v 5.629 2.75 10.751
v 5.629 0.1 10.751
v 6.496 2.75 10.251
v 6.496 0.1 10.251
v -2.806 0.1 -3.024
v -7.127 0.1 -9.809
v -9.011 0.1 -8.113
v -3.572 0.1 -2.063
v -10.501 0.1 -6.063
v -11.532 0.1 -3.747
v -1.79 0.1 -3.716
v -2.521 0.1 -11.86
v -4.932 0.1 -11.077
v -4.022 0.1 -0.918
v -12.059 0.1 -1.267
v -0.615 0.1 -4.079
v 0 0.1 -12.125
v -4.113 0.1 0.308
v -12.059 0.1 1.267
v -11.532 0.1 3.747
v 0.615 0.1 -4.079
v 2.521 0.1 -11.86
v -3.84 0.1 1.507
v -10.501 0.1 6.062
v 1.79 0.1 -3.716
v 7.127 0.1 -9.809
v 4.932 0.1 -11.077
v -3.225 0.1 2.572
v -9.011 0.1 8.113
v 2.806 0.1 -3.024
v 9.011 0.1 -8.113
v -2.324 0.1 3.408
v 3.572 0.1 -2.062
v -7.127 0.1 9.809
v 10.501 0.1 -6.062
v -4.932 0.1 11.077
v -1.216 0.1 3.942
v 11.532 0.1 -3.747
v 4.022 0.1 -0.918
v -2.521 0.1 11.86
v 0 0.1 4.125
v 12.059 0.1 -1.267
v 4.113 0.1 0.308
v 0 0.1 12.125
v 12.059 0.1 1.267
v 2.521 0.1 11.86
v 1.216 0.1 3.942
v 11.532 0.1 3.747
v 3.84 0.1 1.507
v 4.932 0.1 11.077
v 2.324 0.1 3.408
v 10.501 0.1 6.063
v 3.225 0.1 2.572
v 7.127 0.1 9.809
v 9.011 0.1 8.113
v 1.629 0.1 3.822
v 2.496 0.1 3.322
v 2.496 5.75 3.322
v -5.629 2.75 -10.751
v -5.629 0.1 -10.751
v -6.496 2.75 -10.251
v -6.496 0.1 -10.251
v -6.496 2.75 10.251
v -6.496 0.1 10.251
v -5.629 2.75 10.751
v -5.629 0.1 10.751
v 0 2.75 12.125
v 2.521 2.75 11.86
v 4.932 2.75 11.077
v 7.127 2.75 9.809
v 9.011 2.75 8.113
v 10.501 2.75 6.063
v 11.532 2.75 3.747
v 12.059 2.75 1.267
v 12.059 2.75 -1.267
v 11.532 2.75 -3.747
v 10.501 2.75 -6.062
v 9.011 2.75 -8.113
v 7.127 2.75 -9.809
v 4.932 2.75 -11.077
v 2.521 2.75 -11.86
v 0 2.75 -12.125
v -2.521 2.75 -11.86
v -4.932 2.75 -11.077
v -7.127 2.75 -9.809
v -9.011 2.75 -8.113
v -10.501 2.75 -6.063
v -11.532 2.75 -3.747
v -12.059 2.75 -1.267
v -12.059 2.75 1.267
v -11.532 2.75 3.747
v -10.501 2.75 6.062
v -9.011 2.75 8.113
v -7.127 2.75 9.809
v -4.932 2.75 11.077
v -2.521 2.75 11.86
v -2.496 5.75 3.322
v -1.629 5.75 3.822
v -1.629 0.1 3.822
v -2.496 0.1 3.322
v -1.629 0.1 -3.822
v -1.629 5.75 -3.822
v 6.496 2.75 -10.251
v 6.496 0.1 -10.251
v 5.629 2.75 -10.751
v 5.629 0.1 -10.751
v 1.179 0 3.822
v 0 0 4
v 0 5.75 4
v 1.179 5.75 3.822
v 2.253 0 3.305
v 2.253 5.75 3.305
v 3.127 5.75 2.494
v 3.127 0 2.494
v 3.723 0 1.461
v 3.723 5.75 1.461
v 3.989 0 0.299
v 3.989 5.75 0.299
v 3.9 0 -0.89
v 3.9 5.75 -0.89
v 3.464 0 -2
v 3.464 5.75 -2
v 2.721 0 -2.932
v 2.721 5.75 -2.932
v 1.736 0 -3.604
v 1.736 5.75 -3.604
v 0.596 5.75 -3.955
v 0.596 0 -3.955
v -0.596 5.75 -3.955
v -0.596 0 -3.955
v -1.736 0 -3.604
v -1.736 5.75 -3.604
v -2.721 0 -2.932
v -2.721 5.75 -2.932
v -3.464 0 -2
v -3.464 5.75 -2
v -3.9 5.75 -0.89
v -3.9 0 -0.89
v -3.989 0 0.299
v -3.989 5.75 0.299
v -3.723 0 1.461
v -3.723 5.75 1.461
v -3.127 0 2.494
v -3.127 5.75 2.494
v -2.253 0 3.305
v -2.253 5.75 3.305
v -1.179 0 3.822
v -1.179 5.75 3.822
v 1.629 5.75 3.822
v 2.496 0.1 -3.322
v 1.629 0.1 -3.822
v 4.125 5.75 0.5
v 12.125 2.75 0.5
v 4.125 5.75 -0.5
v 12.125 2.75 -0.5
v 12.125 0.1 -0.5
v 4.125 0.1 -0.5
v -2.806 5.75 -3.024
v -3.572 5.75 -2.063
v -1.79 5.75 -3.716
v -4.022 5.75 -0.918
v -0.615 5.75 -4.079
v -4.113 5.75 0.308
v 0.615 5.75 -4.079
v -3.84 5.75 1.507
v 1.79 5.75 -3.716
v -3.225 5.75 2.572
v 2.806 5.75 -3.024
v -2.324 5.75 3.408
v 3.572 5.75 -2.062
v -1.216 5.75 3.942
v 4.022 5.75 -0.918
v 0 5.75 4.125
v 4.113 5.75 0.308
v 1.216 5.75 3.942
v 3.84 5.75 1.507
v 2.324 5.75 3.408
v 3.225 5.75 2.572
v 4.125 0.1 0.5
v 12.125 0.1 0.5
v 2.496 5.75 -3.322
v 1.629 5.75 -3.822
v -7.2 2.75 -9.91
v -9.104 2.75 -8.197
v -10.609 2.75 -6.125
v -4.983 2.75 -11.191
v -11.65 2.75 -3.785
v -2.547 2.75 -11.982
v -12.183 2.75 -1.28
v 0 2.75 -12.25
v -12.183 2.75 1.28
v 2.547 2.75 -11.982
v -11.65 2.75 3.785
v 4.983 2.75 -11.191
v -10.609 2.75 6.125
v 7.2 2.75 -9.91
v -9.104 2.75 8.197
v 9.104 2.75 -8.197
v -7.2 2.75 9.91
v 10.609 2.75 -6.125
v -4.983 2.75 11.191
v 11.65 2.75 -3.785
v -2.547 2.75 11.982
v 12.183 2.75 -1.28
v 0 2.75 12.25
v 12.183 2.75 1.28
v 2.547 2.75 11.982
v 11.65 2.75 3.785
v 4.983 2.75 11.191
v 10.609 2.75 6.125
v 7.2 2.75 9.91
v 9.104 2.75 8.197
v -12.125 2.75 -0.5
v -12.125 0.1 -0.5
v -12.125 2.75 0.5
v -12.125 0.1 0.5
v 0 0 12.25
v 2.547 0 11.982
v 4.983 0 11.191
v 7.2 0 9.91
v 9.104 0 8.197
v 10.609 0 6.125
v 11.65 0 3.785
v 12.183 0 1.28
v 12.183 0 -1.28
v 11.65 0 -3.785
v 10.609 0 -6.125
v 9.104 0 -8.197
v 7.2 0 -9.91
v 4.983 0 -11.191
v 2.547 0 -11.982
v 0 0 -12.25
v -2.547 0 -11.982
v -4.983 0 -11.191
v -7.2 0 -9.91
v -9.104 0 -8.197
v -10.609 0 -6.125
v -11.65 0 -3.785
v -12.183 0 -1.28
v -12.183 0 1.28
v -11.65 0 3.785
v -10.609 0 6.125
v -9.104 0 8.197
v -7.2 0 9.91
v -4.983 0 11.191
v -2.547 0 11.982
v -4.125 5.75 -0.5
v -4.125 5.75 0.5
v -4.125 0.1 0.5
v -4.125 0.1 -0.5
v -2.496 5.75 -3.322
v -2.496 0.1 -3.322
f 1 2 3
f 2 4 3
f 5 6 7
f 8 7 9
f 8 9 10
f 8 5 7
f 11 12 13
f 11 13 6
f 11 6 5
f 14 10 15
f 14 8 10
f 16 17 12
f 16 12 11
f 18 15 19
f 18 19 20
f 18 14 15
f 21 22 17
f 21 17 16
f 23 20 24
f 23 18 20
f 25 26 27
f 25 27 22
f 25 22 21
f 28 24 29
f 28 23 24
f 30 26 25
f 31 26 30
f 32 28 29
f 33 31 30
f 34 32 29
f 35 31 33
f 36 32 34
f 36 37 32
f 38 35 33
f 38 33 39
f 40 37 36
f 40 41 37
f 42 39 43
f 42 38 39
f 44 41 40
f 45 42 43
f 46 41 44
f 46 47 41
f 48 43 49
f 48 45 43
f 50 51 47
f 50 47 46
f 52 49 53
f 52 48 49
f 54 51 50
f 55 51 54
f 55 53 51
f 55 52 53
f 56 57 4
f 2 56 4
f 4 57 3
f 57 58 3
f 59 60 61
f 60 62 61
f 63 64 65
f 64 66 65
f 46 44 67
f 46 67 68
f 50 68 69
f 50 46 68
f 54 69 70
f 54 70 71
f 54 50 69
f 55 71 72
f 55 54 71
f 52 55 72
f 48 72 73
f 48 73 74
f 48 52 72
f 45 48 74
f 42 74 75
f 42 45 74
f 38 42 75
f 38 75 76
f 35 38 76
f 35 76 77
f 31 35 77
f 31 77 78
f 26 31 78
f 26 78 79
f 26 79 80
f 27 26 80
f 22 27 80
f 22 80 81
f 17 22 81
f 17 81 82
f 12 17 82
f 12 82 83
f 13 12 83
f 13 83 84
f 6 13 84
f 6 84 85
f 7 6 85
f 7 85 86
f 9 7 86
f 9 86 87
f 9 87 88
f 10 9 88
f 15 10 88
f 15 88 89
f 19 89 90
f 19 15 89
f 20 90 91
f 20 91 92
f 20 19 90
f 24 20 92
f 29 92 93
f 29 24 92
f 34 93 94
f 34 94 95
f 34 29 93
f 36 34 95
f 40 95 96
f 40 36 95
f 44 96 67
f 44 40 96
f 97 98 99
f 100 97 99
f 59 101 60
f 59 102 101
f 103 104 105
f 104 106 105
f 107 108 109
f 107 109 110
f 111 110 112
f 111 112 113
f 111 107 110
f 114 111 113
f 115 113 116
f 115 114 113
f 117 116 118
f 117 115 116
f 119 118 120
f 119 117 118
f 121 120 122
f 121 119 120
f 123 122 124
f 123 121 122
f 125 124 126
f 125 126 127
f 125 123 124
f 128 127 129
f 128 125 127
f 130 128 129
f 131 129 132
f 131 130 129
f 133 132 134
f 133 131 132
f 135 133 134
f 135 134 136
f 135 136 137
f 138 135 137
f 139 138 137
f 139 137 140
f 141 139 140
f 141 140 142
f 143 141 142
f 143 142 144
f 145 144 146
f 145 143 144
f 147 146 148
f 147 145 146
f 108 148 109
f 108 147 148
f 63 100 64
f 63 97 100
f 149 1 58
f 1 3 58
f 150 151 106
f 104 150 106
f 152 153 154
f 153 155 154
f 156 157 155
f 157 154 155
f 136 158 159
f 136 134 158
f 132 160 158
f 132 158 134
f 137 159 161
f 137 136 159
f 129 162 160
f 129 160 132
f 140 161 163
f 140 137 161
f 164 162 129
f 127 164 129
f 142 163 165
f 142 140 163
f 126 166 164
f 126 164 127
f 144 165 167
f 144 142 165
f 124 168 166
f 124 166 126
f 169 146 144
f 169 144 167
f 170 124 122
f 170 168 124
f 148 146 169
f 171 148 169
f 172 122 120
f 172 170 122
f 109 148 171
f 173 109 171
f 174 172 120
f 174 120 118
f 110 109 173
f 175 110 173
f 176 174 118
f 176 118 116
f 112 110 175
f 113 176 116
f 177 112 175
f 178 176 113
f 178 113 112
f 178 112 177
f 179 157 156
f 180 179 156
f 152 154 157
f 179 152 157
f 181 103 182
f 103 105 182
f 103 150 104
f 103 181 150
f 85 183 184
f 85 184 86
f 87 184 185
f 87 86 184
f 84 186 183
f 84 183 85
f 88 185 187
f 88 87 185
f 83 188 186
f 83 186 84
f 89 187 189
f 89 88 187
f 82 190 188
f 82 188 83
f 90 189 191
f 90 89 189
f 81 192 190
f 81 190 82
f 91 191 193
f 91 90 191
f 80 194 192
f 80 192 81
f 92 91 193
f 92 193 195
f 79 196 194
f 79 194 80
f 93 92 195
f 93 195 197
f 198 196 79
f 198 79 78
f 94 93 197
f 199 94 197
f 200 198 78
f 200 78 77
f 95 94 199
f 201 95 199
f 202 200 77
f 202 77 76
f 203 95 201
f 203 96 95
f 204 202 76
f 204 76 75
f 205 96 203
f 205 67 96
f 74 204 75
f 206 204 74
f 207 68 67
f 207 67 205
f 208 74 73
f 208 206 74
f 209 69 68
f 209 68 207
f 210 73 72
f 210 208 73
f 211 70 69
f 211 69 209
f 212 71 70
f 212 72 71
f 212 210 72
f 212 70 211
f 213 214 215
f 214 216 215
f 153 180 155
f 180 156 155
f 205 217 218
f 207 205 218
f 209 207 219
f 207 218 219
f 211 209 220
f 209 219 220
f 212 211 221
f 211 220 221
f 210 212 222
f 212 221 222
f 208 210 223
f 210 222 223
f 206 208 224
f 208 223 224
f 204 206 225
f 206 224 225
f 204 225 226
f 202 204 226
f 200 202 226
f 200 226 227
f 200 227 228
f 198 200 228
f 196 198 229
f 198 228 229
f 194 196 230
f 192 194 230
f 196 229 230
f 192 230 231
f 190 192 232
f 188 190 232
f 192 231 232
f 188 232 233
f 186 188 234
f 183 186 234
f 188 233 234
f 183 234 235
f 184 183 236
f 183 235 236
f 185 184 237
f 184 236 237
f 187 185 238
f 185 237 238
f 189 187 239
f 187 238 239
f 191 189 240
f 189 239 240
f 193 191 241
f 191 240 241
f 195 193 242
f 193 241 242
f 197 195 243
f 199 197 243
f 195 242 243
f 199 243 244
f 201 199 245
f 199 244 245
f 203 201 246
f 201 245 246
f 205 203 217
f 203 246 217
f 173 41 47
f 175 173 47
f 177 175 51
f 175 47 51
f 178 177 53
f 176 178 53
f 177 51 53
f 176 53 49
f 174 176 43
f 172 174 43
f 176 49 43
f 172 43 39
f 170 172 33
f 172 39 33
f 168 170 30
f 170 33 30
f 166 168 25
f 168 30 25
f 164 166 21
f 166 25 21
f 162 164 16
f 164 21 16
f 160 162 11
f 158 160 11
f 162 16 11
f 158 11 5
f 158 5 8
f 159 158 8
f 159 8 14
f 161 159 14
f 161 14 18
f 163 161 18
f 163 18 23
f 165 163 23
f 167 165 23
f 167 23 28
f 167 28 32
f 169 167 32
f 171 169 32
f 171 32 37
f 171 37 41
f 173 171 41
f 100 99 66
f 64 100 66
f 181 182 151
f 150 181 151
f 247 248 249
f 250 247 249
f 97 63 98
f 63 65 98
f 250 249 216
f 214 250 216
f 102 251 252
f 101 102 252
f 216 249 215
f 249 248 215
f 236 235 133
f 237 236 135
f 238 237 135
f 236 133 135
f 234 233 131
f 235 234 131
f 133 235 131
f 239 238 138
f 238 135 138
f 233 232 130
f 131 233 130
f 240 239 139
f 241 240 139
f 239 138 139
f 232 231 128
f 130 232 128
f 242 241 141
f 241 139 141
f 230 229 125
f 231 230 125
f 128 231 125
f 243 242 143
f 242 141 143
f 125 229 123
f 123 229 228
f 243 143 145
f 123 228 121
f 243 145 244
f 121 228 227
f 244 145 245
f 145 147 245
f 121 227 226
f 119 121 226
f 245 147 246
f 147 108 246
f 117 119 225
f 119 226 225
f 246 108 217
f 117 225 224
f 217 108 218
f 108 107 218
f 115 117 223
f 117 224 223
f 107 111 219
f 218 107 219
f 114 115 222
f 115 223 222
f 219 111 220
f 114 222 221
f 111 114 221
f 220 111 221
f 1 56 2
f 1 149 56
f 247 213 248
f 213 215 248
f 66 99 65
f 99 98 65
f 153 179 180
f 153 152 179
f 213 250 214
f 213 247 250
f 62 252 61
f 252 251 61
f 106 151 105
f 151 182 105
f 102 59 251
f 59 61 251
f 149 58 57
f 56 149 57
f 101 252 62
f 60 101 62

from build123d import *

# Parameters (mm, degrees)
SKETCH1_R           = 4.125
SKETCH1_R_2         = 4
BOSS_EXTRUDE1_DEPTH = 5.75
SKETCH1_4_R         = 12.25
SKETCH1_4_R_2       = 12.125
BOSS_EXTRUDE2_DEPTH = 2.75
SKETCH1_5_R         = 12.125
SKETCH1_5_R_2       = 4.125
BOSS_EXTRUDE3_DEPTH = 0.1
BOSS_EXTRUDE5_DEPTH = 0.5
CIRPATTERN4_COUNT   = 6


with BuildPart() as part:
    # Sketch1 → Boss-Extrude1 (new body)
    with BuildSketch(Plane(origin=(0, 0, 0), x_dir=(1, 0, 0), z_dir=(0, 1, 0))):
        with Locations(Location((0, 0, 0), (0, 0, 270))):
            Circle(SKETCH1_R)
        with Locations(Location((0, 0, 0), (0, 0, 270))):
            Circle(SKETCH1_R_2, mode=Mode.SUBTRACT)
    extrude(amount=BOSS_EXTRUDE1_DEPTH)



with BuildPart() as body_2:
    # Sketch1<4> → Boss-Extrude2 (new body)
    with BuildSketch(Plane(origin=(0, 0, 0), x_dir=(1, 0, 0), z_dir=(0, 1, 0))):
        with Locations(Location((0, 0, 0), (0, 0, 270))):
            Circle(SKETCH1_4_R)
        with Locations(Location((0, 0, 0), (0, 0, 270))):
            Circle(SKETCH1_4_R_2, mode=Mode.SUBTRACT)
    extrude(amount=BOSS_EXTRUDE2_DEPTH)


with BuildPart() as part_1:
    add(part.part)

    add(body_2.part)  # Boss-Extrude3 merges body 2
    # Sketch1<5> → Boss-Extrude3 (add)
    with BuildSketch(Plane(origin=(0, 0, 0), x_dir=(1, 0, 0), z_dir=(0, 1, 0))):
        with Locations(Location((0, 0, 0), (0, 0, 270))):
            Circle(SKETCH1_5_R)
        with Locations(Location((0, 0, 0), (0, 0, 270))):
            Circle(SKETCH1_5_R_2, mode=Mode.SUBTRACT)
    extrude(amount=BOSS_EXTRUDE3_DEPTH)


with BuildPart() as body_2_2:
    # Sketch7 → Boss-Extrude5 (new, symmetric)
    with BuildSketch(Plane.XY):
        Polygon((-4.125, 0.1), (-12.125, 0.1), (-12.125, 2.75), (-4.125, 5.75), align=None)
    extrude(amount=BOSS_EXTRUDE5_DEPTH, both=True)


with BuildPart() as cirpattern4_1:
    # CirPattern4: pattern copy
    add(body_2_2.part.rotate(Axis((0, 0, 0), (0, 1, 0)), 1 * 360 / CIRPATTERN4_COUNT))


with BuildPart() as cirpattern4_2:
    # CirPattern4: pattern copy
    add(body_2_2.part.rotate(Axis((0, 0, 0), (0, 1, 0)), 2 * 360 / CIRPATTERN4_COUNT))


with BuildPart() as cirpattern4_3:
    # CirPattern4: pattern copy
    add(body_2_2.part.rotate(Axis((0, 0, 0), (0, 1, 0)), 3 * 360 / CIRPATTERN4_COUNT))


with BuildPart() as cirpattern4_4:
    # CirPattern4: pattern copy
    add(body_2_2.part.rotate(Axis((0, 0, 0), (0, 1, 0)), 4 * 360 / CIRPATTERN4_COUNT))


with BuildPart() as cirpattern4_5:
    # CirPattern4: pattern copy
    add(body_2_2.part.rotate(Axis((0, 0, 0), (0, 1, 0)), 5 * 360 / CIRPATTERN4_COUNT))


solid = Compound([part_1.part, body_2_2.part, cirpattern4_1.part, cirpattern4_2.part, cirpattern4_3.part, cirpattern4_4.part, cirpattern4_5.part])
